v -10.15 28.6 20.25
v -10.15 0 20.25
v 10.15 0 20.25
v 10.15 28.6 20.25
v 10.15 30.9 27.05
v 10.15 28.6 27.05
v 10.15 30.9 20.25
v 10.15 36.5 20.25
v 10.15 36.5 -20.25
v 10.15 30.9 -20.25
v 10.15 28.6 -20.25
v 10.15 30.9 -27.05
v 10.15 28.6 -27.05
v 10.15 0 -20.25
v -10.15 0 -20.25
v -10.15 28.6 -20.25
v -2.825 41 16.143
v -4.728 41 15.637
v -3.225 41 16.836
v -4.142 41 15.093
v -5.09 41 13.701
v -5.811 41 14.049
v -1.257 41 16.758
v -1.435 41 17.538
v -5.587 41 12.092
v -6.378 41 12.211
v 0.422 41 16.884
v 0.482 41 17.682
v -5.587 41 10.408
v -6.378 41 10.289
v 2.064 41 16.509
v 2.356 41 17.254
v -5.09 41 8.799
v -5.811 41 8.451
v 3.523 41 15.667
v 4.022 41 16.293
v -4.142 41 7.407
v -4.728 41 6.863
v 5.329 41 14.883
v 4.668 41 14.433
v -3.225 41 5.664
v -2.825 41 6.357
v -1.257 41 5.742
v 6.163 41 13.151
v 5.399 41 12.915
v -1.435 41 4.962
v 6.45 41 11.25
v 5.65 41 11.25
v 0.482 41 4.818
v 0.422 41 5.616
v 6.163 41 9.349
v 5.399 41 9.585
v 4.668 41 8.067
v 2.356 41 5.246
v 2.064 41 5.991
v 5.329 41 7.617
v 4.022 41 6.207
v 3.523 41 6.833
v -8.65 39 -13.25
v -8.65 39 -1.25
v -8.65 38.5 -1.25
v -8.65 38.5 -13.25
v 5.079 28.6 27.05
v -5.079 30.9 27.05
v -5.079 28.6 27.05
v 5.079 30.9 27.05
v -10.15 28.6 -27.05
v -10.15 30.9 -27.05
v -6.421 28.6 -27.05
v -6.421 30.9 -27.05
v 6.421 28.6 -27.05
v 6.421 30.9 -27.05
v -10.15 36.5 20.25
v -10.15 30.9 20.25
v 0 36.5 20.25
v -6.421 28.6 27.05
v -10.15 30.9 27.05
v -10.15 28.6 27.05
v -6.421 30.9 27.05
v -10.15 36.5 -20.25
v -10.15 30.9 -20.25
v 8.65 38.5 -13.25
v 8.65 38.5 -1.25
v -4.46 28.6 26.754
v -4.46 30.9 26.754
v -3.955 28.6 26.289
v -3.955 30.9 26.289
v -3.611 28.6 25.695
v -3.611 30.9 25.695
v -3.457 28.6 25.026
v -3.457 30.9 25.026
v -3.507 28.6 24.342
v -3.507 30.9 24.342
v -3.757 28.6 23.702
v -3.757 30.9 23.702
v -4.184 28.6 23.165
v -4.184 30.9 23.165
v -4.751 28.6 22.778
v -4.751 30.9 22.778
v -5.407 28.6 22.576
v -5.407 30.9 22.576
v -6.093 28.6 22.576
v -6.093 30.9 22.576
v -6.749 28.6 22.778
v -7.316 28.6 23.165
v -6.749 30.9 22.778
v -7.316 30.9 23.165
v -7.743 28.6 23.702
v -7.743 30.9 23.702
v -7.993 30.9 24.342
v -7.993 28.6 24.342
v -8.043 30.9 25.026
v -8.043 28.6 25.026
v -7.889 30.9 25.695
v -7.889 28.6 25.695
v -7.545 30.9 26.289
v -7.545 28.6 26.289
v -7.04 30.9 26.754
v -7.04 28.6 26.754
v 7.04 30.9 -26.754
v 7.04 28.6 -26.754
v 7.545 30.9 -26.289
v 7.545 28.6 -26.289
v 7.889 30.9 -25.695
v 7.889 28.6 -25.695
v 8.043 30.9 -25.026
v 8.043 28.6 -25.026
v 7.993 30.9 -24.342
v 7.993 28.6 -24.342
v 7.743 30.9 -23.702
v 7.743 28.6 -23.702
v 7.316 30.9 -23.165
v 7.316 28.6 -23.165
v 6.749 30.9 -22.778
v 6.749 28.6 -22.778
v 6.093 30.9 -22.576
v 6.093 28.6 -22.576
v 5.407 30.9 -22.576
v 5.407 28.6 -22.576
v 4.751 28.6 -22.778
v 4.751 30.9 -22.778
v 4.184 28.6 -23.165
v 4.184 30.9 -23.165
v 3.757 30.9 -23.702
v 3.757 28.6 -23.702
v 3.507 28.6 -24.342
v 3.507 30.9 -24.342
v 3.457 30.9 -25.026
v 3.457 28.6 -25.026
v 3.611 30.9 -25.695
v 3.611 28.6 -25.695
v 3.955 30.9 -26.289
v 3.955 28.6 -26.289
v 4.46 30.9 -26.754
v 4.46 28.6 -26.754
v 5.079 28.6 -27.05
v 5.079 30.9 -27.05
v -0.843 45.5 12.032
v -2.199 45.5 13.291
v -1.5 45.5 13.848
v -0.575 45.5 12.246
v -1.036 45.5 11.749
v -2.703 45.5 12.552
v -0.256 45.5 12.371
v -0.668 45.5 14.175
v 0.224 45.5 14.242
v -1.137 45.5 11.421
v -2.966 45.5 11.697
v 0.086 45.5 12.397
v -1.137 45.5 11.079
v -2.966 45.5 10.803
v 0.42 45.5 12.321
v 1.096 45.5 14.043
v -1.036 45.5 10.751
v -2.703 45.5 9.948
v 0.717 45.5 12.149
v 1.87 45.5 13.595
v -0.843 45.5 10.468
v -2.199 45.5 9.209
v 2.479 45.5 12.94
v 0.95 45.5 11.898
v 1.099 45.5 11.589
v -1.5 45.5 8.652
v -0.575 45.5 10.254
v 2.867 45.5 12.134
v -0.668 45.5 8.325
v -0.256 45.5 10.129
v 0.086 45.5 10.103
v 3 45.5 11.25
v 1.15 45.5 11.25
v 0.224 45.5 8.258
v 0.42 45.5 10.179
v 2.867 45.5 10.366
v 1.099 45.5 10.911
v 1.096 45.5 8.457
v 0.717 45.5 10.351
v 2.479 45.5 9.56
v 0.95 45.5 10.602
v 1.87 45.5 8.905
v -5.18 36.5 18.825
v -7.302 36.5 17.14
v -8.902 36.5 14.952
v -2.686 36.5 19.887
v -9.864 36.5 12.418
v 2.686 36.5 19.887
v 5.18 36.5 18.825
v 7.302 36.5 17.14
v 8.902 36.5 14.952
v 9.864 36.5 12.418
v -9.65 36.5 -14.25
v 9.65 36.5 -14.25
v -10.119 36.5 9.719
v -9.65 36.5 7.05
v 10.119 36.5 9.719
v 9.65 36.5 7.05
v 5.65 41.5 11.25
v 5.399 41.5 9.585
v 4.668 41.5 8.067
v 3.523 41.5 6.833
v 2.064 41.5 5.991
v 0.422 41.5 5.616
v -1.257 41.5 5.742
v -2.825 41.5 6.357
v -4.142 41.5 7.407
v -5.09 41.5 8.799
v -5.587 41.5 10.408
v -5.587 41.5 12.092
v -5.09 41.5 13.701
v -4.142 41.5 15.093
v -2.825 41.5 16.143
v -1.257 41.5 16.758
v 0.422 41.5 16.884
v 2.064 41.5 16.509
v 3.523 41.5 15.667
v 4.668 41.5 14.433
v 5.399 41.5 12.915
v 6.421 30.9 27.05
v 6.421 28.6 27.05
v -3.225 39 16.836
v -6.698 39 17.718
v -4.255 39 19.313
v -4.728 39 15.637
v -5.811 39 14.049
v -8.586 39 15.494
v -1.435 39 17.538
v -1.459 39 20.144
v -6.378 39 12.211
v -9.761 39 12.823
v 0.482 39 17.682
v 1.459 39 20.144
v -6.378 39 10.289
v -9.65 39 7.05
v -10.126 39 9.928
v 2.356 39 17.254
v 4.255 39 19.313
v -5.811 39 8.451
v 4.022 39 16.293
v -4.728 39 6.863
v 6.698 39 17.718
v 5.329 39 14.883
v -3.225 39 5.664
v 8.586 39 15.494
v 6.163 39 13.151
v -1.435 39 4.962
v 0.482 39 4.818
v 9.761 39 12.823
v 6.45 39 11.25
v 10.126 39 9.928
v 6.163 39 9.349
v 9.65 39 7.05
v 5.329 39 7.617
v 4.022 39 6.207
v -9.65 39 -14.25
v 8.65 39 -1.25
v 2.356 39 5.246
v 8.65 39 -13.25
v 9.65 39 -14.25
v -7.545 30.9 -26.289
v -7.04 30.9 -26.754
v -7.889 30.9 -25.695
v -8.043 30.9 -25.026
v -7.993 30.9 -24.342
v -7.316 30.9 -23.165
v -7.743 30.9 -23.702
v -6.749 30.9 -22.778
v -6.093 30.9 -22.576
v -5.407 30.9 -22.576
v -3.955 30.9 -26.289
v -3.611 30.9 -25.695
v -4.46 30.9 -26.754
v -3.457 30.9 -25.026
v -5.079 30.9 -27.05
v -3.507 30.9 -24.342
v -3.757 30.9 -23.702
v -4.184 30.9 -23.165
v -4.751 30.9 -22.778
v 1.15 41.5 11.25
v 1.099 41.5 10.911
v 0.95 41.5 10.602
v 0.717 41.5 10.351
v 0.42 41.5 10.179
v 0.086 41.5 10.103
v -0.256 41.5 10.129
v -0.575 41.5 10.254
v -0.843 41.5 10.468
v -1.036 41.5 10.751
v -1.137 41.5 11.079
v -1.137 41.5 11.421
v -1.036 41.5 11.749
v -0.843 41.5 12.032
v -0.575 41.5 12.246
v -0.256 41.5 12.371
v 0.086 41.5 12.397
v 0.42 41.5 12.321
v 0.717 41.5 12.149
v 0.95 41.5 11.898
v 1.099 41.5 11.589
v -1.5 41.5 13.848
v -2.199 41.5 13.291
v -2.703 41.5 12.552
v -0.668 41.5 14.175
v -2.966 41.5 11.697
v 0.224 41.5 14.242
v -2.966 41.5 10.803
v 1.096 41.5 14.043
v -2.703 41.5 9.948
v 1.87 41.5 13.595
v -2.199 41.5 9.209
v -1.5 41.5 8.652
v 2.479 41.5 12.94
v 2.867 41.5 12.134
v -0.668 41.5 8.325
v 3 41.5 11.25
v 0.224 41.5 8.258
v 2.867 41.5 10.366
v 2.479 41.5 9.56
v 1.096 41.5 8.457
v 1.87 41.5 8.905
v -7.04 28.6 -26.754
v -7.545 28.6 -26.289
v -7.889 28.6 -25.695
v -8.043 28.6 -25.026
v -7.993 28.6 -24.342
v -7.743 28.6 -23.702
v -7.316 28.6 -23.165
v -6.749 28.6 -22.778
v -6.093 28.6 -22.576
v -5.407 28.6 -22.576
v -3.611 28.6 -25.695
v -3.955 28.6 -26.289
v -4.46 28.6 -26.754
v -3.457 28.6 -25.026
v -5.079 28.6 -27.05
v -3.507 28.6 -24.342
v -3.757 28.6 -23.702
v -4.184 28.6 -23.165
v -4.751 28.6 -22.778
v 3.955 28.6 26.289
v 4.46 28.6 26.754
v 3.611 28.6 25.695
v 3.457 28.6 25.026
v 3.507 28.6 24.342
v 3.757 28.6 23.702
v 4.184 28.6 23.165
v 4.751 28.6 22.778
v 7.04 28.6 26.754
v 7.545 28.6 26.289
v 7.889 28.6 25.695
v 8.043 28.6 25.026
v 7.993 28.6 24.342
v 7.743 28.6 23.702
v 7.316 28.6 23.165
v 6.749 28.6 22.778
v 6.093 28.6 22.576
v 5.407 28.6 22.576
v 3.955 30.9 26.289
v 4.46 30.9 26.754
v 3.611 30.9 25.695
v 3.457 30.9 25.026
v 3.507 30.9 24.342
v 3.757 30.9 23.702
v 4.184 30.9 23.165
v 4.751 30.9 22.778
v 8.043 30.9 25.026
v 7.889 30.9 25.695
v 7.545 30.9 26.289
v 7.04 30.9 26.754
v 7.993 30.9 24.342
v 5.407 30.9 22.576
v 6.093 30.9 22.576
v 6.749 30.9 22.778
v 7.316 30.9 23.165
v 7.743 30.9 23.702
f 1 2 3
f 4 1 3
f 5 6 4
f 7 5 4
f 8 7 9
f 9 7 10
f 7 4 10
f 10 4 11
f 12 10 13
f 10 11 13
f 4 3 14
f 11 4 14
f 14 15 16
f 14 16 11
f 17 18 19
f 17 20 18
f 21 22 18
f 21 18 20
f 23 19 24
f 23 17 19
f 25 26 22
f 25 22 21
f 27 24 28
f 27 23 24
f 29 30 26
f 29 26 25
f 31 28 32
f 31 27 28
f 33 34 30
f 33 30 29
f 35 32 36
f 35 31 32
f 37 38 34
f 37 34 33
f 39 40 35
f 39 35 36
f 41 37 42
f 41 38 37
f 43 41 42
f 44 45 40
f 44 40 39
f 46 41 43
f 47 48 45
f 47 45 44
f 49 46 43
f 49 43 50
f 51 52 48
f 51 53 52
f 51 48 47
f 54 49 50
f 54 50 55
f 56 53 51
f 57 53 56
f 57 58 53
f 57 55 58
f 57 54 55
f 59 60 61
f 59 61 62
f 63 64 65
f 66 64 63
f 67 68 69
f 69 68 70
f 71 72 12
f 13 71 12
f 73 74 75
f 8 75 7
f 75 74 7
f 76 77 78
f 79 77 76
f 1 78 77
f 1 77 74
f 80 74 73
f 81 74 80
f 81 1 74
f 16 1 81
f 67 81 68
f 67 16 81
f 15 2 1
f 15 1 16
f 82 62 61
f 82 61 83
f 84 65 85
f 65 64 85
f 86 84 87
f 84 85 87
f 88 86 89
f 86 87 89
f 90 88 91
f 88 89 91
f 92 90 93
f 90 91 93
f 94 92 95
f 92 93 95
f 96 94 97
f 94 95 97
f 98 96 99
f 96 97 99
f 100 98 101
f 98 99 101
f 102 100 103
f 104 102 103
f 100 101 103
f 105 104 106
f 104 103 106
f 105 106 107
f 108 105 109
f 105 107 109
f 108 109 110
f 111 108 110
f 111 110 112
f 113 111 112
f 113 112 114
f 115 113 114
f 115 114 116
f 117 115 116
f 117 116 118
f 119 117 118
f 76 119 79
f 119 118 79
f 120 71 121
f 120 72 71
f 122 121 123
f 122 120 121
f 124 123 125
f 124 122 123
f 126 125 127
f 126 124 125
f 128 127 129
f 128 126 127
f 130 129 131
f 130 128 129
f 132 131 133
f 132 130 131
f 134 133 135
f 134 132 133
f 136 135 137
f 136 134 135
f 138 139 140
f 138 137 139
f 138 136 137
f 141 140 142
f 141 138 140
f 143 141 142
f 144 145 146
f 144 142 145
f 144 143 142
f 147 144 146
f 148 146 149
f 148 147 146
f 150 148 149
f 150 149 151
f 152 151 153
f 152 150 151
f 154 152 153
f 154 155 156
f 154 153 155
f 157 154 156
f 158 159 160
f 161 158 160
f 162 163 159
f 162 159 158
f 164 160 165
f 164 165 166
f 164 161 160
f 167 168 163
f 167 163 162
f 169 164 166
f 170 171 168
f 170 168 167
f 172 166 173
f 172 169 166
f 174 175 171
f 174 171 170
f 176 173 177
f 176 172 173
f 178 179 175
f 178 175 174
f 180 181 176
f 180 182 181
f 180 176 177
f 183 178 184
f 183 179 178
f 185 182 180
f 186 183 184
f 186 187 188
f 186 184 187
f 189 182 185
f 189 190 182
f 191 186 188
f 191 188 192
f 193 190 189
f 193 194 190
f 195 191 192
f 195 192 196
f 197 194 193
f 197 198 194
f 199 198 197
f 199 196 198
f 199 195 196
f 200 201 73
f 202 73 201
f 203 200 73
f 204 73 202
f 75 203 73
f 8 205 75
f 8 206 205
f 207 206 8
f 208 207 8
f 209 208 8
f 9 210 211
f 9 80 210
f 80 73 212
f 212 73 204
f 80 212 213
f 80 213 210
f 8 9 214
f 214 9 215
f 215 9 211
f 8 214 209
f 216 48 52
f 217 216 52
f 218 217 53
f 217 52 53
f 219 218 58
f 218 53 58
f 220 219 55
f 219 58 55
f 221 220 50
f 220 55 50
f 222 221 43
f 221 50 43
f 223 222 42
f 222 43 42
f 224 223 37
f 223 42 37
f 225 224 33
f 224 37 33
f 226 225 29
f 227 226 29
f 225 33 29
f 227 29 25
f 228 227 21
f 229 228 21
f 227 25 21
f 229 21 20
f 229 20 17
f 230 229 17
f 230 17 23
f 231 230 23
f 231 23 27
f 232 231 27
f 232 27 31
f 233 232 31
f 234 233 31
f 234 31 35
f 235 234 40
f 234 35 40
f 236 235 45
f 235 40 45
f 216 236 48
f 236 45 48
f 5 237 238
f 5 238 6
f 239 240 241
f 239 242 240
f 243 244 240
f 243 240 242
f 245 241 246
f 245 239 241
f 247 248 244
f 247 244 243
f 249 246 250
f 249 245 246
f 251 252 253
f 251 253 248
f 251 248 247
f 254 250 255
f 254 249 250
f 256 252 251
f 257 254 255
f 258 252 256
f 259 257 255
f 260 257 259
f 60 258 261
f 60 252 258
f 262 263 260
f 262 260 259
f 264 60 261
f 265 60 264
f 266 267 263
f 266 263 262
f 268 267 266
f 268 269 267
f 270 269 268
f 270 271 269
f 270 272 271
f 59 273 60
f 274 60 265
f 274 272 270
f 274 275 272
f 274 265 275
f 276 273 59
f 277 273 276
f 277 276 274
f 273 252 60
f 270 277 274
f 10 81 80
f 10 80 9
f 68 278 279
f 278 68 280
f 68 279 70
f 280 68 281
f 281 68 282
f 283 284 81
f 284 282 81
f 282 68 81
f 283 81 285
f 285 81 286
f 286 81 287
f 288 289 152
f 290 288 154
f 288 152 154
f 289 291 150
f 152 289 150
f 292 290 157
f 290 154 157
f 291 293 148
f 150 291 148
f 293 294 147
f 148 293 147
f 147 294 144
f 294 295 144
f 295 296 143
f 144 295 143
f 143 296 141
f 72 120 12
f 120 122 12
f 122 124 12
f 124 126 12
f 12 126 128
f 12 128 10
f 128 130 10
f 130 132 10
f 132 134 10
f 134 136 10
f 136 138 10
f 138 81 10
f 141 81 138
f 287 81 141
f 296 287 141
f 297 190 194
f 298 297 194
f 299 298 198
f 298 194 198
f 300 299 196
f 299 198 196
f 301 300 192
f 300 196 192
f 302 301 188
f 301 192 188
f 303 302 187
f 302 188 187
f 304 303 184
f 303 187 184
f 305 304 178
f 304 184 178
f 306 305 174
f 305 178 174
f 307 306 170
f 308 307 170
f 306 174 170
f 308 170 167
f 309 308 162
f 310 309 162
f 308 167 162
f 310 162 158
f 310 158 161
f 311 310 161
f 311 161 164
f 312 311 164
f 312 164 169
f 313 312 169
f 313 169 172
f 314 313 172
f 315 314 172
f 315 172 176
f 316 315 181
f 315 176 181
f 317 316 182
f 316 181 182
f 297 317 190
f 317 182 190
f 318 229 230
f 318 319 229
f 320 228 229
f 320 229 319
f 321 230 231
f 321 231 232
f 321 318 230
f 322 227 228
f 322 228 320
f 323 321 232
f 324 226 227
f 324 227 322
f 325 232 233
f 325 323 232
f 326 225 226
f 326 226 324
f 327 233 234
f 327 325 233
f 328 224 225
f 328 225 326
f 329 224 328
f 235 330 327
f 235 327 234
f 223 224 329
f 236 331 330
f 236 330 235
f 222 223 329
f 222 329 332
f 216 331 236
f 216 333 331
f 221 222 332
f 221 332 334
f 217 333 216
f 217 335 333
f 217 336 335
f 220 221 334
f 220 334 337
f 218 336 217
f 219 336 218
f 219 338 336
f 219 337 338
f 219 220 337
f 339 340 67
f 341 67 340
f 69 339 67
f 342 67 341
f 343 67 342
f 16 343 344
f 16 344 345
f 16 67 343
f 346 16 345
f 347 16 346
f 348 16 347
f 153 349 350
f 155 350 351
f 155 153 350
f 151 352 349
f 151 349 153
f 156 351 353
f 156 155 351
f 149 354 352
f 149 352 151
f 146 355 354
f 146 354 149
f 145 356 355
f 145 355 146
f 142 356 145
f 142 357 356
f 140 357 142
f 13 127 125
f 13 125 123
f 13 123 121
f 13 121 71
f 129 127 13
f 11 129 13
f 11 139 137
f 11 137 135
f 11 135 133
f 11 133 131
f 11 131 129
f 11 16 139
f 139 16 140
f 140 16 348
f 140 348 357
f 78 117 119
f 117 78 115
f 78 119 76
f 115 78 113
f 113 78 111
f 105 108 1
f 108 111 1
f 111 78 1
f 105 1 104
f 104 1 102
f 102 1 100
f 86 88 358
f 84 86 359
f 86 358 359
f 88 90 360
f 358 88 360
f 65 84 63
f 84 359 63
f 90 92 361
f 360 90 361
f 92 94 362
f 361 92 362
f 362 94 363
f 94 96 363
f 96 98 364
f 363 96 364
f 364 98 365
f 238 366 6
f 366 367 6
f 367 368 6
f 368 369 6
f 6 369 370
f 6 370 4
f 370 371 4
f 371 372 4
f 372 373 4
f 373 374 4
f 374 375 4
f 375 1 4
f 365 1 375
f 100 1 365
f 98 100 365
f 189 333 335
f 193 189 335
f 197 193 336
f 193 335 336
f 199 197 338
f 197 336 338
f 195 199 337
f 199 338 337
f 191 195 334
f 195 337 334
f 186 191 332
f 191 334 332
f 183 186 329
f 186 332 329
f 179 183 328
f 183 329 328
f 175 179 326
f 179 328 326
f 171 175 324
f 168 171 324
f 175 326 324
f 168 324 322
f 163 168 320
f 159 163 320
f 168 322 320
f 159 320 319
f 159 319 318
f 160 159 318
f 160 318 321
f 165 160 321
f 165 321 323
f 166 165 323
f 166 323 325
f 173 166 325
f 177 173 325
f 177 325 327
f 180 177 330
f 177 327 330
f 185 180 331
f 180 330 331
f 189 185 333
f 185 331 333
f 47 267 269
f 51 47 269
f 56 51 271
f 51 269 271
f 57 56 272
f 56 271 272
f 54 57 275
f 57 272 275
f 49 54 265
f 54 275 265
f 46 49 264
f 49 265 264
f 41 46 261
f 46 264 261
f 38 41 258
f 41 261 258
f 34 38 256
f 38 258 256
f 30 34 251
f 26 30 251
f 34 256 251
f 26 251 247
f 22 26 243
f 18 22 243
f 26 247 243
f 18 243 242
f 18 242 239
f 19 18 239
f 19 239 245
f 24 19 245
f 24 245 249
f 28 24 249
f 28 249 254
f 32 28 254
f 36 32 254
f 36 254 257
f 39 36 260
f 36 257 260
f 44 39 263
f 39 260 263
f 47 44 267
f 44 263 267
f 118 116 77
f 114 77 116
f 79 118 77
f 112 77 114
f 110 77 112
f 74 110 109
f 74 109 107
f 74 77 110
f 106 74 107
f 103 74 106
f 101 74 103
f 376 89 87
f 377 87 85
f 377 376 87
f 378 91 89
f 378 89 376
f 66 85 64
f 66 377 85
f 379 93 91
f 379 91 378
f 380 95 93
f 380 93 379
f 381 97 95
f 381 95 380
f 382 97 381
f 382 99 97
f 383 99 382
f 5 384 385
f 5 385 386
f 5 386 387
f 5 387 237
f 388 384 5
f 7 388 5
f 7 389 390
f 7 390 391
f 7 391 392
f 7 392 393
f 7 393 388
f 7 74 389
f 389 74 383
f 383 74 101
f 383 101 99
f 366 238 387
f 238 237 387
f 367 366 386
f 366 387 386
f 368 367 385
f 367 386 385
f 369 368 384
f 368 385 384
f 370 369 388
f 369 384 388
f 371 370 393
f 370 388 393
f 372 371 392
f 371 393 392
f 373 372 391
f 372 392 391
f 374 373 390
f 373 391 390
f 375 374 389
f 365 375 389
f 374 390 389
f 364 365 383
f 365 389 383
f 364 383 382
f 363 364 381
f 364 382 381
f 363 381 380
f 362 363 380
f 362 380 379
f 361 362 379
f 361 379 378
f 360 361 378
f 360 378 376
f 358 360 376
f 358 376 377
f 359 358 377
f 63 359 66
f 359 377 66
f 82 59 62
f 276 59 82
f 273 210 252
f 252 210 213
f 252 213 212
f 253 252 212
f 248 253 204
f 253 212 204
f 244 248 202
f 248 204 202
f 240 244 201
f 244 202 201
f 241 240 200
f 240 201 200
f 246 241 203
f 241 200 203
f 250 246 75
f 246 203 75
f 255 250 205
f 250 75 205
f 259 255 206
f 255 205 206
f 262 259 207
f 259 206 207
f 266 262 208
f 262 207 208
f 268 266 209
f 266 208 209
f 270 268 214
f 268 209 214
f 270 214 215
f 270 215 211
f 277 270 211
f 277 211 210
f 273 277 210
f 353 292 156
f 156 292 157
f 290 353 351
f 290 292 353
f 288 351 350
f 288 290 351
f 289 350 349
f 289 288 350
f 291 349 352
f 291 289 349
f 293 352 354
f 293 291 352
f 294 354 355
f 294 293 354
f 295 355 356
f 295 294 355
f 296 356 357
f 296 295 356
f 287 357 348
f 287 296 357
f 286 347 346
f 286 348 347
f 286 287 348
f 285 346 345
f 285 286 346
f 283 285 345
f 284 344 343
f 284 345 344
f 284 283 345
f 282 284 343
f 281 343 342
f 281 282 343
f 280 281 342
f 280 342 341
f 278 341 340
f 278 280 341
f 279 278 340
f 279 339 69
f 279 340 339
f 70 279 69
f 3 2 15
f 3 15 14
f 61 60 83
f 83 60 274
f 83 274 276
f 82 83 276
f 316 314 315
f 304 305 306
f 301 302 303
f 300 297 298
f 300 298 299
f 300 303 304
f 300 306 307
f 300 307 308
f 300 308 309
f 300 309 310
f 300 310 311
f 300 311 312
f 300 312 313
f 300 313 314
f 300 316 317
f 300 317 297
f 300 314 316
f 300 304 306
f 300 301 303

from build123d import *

# Parameters (mm, degrees)
SKETCH1_W           = 20.3
SKETCH1_H           = 40.5
BOSS_EXTRUDE1_DEPTH = 36.5
SKETCH4_W           = 20.3
SKETCH4_H           = 2.3
BOSS_EXTRUDE4_DEPTH = 6.8
SKETCH5_R           = 2.3
CUT_EXTRUDE1_DEPTH  = 2.3
BOSS_EXTRUDE5_DEPTH = 2.5
SKETCH10_R          = 6.45
BOSS_EXTRUDE6_DEPTH = 2
SKETCH11_R          = 5.65
BOSS_EXTRUDE7_DEPTH = 0.5
SKETCH12_R          = 3
BOSS_EXTRUDE8_DEPTH = 4
SKETCH13_R          = 1.15
CUT_EXTRUDE2_DEPTH  = 4
SKETCH14_W          = 17.3
SKETCH14_H          = 12
CUT_EXTRUDE3_DEPTH  = 0.5


with BuildPart() as part:
    # Sketch1 → Boss-Extrude1 (new body)
    with BuildSketch(Plane(origin=(0, 0, 0), x_dir=(1, 0, 0), z_dir=(0, 1, 0))):
        Rectangle(SKETCH1_W, SKETCH1_H)
    extrude(amount=BOSS_EXTRUDE1_DEPTH)

    # Sketch4 → Boss-Extrude4 (add)
    with BuildSketch(Plane.XY.offset(20.25)):
        with Locations((0, 29.75)):
            Rectangle(SKETCH4_W, SKETCH4_H)
    boss_extrude4 = extrude(amount=BOSS_EXTRUDE4_DEPTH)

    # Sketch5 → Cut-Extrude1 (cut)
    with BuildSketch(Plane(origin=(0, 30.9, 0), x_dir=(1, 0, 0), z_dir=(0, 1, 0))):
        with Locations((5.75, -24.85)):
            Circle(SKETCH5_R)
        with Locations((-5.75, -24.85)):
            Circle(SKETCH5_R)
    cut_extrude1 = extrude(amount=-CUT_EXTRUDE1_DEPTH, mode=Mode.SUBTRACT)

    # Mirror2: Boss-Extrude4, Cut-Extrude1 across plane
    add(boss_extrude4.mirror(Plane.XY))
    add(cut_extrude1.mirror(Plane.XY), mode=Mode.SUBTRACT)

    # Sketch7 → Boss-Extrude5 (add)
    with BuildSketch(Plane(origin=(0, 36.5, 0), x_dir=(1, 0, 0), z_dir=(0, 1, 0))):
        with BuildLine():
            Line((-9.65, 14.25), (-9.65, -7.05))
            ThreePointArc((-9.65, -7.05), (0, -20.25), (9.65, -7.05))
            Line((9.65, -7.05), (9.65, 14.25))
            Line((9.65, 14.25), (-9.65, 14.25))
        make_face()
    extrude(amount=BOSS_EXTRUDE5_DEPTH)

    # Sketch10 → Boss-Extrude6 (add)
    with BuildSketch(Plane(origin=(0, 39, 0), x_dir=(1, 0, 0), z_dir=(0, 1, 0))):
        with Locations((0, -11.25)):
            Circle(SKETCH10_R)
    extrude(amount=BOSS_EXTRUDE6_DEPTH)

    # Sketch11 → Boss-Extrude7 (add)
    with BuildSketch(Plane(origin=(0, 41, 0), x_dir=(1, 0, 0), z_dir=(0, 1, 0))):
        with Locations((0, -11.25)):
            Circle(SKETCH11_R)
    extrude(amount=BOSS_EXTRUDE7_DEPTH)

    # Sketch12 → Boss-Extrude8 (add)
    with BuildSketch(Plane(origin=(0, 41.5, 0), x_dir=(1, 0, 0), z_dir=(0, 1, 0))):
        with Locations((0, -11.25)):
            Circle(SKETCH12_R)
    extrude(amount=BOSS_EXTRUDE8_DEPTH)

    # Sketch13 → Cut-Extrude2 (cut)
    with BuildSketch(Plane(origin=(0, 45.5, 0), x_dir=(1, 0, 0), z_dir=(0, 1, 0))):
        with Locations((0, -11.25)):
            Circle(SKETCH13_R)
    extrude(amount=-CUT_EXTRUDE2_DEPTH, mode=Mode.SUBTRACT)

    # Sketch14 → Cut-Extrude3 (cut)
    with BuildSketch(Plane(origin=(0, 39, 0), x_dir=(1, 0, 0), z_dir=(0, 1, 0))):
        with Locations((0, 7.25)):
            Rectangle(SKETCH14_W, SKETCH14_H)
    extrude(amount=-CUT_EXTRUDE3_DEPTH, mode=Mode.SUBTRACT)


solid = part.part
